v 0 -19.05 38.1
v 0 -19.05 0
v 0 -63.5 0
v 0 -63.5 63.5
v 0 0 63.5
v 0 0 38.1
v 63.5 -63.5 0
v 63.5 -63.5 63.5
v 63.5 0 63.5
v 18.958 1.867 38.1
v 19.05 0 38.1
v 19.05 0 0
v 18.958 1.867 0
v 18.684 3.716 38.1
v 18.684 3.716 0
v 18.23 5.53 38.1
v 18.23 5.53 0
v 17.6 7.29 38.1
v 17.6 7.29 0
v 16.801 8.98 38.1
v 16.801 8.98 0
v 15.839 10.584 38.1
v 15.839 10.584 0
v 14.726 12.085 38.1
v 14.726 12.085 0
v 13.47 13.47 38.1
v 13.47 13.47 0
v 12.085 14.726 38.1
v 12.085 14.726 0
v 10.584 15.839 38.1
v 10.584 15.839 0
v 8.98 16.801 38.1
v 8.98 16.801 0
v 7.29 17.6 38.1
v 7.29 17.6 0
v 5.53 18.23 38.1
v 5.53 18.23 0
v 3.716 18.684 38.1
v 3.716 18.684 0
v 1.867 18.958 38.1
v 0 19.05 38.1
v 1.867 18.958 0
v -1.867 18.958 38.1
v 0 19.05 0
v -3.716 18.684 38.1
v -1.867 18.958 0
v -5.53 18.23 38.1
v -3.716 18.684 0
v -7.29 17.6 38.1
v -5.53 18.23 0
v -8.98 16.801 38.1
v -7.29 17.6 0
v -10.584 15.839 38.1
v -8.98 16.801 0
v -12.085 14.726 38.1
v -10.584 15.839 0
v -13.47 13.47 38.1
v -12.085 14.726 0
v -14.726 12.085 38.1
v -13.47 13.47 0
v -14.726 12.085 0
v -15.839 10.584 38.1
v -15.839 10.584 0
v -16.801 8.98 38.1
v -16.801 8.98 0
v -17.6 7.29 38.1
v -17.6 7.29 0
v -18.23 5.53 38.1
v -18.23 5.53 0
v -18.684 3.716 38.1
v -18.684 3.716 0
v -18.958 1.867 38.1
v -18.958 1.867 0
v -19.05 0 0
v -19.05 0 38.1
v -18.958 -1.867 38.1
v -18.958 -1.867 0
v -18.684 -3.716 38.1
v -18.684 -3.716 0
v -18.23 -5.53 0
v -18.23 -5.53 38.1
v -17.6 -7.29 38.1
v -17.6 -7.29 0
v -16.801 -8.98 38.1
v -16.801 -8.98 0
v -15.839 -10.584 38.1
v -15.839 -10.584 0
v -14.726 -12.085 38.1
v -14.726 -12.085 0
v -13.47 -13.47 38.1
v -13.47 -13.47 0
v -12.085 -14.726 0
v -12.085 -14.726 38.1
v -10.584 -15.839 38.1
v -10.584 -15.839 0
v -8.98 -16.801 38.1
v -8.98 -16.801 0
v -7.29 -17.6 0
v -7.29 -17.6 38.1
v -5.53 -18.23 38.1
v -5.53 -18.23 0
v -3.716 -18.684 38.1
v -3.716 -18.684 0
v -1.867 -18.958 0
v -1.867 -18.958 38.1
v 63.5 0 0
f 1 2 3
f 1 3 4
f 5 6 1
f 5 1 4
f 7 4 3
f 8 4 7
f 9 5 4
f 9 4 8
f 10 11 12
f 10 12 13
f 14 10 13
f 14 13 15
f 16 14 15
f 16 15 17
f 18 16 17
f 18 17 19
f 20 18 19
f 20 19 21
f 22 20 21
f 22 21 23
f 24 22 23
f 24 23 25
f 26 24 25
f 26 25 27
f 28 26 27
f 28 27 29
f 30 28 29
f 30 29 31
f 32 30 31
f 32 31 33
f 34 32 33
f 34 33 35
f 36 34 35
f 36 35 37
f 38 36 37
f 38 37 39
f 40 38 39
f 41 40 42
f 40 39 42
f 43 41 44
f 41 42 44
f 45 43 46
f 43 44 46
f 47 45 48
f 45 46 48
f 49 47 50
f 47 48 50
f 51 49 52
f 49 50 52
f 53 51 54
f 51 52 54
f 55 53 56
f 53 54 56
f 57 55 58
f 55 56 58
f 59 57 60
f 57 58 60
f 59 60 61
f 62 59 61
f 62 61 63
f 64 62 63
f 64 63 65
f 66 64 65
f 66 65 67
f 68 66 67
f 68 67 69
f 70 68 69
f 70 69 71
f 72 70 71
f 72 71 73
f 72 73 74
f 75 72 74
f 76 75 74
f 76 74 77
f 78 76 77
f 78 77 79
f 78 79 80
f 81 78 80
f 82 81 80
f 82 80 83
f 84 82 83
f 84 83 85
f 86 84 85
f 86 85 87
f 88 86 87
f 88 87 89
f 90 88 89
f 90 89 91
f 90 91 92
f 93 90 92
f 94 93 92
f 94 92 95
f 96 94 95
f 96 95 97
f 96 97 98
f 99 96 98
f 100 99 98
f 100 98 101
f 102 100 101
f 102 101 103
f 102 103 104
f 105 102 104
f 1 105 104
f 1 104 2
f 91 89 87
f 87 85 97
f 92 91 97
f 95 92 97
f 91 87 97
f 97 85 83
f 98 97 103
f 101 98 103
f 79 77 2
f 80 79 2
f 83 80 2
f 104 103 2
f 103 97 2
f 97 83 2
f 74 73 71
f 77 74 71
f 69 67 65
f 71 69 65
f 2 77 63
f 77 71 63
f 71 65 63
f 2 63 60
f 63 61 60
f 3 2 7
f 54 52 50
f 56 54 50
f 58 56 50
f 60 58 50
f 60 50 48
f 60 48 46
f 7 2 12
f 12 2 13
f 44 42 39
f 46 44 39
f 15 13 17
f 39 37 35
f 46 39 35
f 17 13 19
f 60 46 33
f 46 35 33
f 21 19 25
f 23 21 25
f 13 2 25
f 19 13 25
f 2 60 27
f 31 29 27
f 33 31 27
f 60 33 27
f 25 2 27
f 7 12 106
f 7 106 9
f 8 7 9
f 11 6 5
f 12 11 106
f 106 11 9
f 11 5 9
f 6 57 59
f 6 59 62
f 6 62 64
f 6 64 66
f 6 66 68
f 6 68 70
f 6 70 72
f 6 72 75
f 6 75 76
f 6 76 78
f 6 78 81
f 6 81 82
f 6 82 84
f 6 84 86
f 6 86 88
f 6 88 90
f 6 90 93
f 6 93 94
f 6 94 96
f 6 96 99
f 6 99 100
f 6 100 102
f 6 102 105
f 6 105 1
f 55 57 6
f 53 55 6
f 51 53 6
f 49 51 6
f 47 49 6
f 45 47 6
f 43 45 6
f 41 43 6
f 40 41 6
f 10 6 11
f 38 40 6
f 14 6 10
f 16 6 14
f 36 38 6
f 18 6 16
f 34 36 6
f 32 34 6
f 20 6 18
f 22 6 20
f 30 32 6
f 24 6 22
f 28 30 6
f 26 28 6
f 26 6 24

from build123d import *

# Parameters (mm, degrees)
F0_W     = 63.5
F0_H     = 63.5
F1_DEPTH = 63.5
F2_R     = 19.05
F3_DEPTH = 38.1
F4_R     = 19.05
F5_DEPTH = 38.1


with BuildPart() as f1:
    # F0 (on Front) → F1 (new body)
    with BuildSketch(Plane.XZ):
        with Locations((31.75, 31.75)):
            Rectangle(F0_W, F0_H)
    extrude(amount=F1_DEPTH)

    # F2 (on Top) → F3 (join)
    with BuildSketch(Plane.XY):
        Circle(F2_R)
    extrude(amount=F3_DEPTH)

    # F4 (on Top) → F5 (join)
    with BuildSketch(Plane.XY):
        Circle(F4_R)
    extrude(amount=F5_DEPTH)


solid = f1.part
